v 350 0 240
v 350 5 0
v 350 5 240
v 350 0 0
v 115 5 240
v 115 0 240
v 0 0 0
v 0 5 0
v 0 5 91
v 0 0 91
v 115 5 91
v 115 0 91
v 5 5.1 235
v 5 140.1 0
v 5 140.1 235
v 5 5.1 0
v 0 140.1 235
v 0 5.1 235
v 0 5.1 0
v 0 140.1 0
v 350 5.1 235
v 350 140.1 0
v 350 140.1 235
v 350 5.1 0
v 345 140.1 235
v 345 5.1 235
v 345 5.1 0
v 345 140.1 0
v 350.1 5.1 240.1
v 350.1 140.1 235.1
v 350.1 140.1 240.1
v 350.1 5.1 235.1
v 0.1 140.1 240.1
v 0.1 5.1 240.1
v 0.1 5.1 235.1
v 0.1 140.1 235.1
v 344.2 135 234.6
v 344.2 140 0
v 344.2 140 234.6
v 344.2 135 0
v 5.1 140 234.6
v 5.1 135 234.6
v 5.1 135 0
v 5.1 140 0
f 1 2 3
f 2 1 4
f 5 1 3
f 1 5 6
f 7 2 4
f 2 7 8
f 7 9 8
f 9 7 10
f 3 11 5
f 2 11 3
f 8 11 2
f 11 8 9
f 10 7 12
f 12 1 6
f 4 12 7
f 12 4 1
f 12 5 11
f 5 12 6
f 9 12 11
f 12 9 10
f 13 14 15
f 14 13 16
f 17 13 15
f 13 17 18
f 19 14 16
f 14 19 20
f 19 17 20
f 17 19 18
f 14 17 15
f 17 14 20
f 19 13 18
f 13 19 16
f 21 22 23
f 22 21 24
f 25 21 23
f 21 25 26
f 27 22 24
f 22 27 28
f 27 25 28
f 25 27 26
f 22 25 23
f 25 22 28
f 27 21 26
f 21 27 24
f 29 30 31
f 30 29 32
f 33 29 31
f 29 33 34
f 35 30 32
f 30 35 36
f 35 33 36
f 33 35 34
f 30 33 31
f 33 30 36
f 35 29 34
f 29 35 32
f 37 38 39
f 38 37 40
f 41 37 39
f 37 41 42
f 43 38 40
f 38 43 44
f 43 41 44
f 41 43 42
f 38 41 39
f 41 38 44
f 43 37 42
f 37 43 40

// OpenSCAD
module perfil_l(posicion = [0,0,0], rotate = [0,0,0], mirror = [0,0,0], alto = 150, grosor = 5, longitud = 50, center=false) {
    // Perfil en L en vertical, primitiva de la base
    translate(posicion)
    rotate(rotate)
    mirror(mirror)
    union(){
        cube([grosor,longitud,alto], center=center);
        cube([longitud,grosor,alto], center=center);
    }
}

module soportes(largo, ancho, alto, grosor = 5, longitud = 50){
    // Soportes de la base del tanque, en vertical
        perfil_l(posicion = [0,ancho,0], mirror = [0,1,0], alto = alto, grosor=grosor, longitud= longitud, center=false);  
        perfil_l(posicion = [largo,ancho,0], mirror = [1,1,0], alto = alto, longitud= longitud,  grosor=grosor,center=false);
        perfil_l(posicion = [0,0,0], mirror = [0,0,0], alto = alto,  grosor=grosor, longitud= longitud, center=false);
        perfil_l(posicion = [largo,0,0], mirror = [1,0,0], alto = alto,  grosor=grosor, longitud= longitud, center=false);
}

module base(longitud = 50, ancho_base = 460, ancho_caja = 230, largo_base= 460*(750/460), grosor = 5){
    perfil_l(posicion = [longitud,-(ancho_base-ancho_caja)/2,0], rotate= [0,90,90], mirror = [0,0,0], alto = ancho_base, grosor = grosor, longitud= longitud, center=false);
    perfil_l(posicion = [largo_base,-(ancho_base-ancho_caja)/2,0], rotate = [0,90,270], mirror = [0,0,1], alto = ancho_base, grosor = grosor, longitud= longitud, center=false);
    perfil_l(posicion = [longitud,longitud,0], rotate= [270,0,270], mirror = [0,0,0], alto = largo_base-longitud, grosor = grosor, longitud= longitud, center=false);
    perfil_l(posicion = [longitud,ancho_caja- longitud,0], rotate = [270,0,270], mirror = [1,0,0], alto = largo_base-longitud, grosor = grosor, longitud= longitud, center=false);
}

module caja(posicion = [0,0,0], rotate = [0,0,0], mirror = [0,0,0], alto = 25, ancho = 230, largo = 50,  grosor = 3, caras = 4) {
    translate(posicion)
    rotate(rotate)
    mirror(mirror) 
    difference() {
        cube([largo,ancho,alto]);
            translate([grosor,grosor,grosor])
            cube([largo-2*grosor,ancho-2*grosor, alto]);
}}

module tanque(posicion = [0,0,0], rotate = [0,0,0], mirror = [0,0,0], alto = 25, ancho = 230, largo = 50,  grosor = 3) {
    translate(posicion)
    rotate(rotate)
    mirror(mirror) 
    difference() {
        cube([largo,ancho,alto]);
        translate([grosor,grosor,grosor])
        cube([largo-2*grosor,ancho-2*grosor, alto]);
        translate([grosor+largo/20,-ancho/2,grosor])
        cube([largo-largo/10-2*grosor,ancho-2*grosor, alto]);
    }
}

module estructura_tanques(
    longitud = 50, 
    ancho_caja = 230, 
    largo_caja_1 = 350, 
    alto_caja_1 = 150, 
    largo_caja_2 = 230, 
    alto_caja_2 = 435, 
    grosor = 5, 
    grosor_tanque = 2, 
    alto_tanque_1 = 200, 
    alto_tanque_2 = 340
){
    // Soportes de la base del tanque
    color("hotpink")
    base(longitud = longitud, ancho_base = ancho_caja+230, ancho_caja = ancho_caja, grosor = grosor, largo_base = largo_caja_2+largo_caja_1+largo_caja_1*0.1+160);
    
    // tanque 1
    soportes(largo = largo_caja_1, ancho = ancho_caja, alto = alto_caja_1, grosor = grosor,  longitud= longitud);
    caja(posicion = [-largo_caja_1*0.1/2,-ancho_caja*0.1/2,alto_caja_1], alto = 25, ancho = ancho_caja+ancho_caja*0.1, largo = largo_caja_1+ largo_caja_1*0.1, grosor = grosor_tanque);
    tanque(posicion = [-largo_caja_1*0.1/2+grosor*2,-ancho_caja*0.1/2+grosor*2,alto_caja_1+grosor], alto = alto_tanque_1, ancho = ancho_caja+ ancho_caja*0.1-grosor*4, largo = largo_caja_1+ largo_caja_1*0.1-grosor*4, grosor = grosor_tanque);
    translate([-largo_caja_1*0.1/2+grosor*2+ grosor_tanque,-ancho_caja*0.1/2+grosor*2+grosor_tanque,alto_caja_1])
    color("white", alpha = 0.3)
    cube([largo_caja_1+ largo_caja_1*0.1-grosor*4-grosor_tanque*2, grosor_tanque, alto_tanque_1+grosor]);

    // tanque 2
    translate([largo_caja_1+largo_caja_1*0.1,0,0]){
        soportes(largo = largo_caja_2, ancho = ancho_caja, alto = alto_caja_2, grosor = grosor,  longitud= longitud);
        caja(posicion = [grosor,grosor,alto_caja_2-alto_caja_2*0.13], alto = 25, ancho = ancho_caja-grosor*2, largo = largo_caja_2-grosor*2, grosor = grosor_tanque);
        tanque(posicion = [grosor+grosor_tanque,grosor+grosor_tanque,alto_caja_2-alto_caja_2*0.13+grosor_tanque], alto = alto_tanque_2, ancho = ancho_caja-grosor*2-grosor_tanque*2, largo = largo_caja_2-grosor*2-grosor_tanque*2, grosor = grosor_tanque);
        translate([grosor+grosor_tanque*2,grosor+grosor_tanque*2,alto_caja_2-alto_caja_2*0.13])
        color("white", alpha = 0.3)
        cube([largo_caja_2-grosor*2-grosor_tanque*2-grosor_tanque*2, grosor_tanque, alto_tanque_2+grosor_tanque]);
    }
}


module metacrilato(){
    union(){
        difference() {
            cube([350,5,240]);
            translate([-50,-50,240-150+1])
            cube([115+50,150,151]);
        }
        translate([0,5.1,0])
        cube([5,135,235]);
        translate([345,5.1,0])
        cube([5,135,235]);
        translate([0.1,5.1,235.1])
        cube([350,135,5]);
        translate([5.1,135,0])
        cube([339.1,5,234.6]);
        }
}


// PARÁMETROS DEL TANQUE (ACTUALMENTE)
// Perfil en L
grosor = 5;
longitud = 50;

// Soportes del tanque 1
ancho_caja = 230;
largo_caja_1 = 350;
alto_caja_1 = 150;
alto_tanque_1 = 200;

// Soportes del tanque 2
largo_caja_2 = 230;
alto_caja_2 = 435;
alto_tanque_2 = 340;

// Grosor de los tanques
grosor_tanque = 2;


// estructura_tanques(longitud = longitud, ancho_caja = ancho_caja, largo_caja_1 = largo_caja_1, alto_caja_1 = alto_caja_1, largo_caja_2 = largo_caja_2, alto_caja_2 = alto_caja_2, grosor = grosor, grosor_tanque = grosor_tanque, alto_tanque_1 = alto_tanque_1, alto_tanque_2 = alto_tanque_2);
metacrilato();
